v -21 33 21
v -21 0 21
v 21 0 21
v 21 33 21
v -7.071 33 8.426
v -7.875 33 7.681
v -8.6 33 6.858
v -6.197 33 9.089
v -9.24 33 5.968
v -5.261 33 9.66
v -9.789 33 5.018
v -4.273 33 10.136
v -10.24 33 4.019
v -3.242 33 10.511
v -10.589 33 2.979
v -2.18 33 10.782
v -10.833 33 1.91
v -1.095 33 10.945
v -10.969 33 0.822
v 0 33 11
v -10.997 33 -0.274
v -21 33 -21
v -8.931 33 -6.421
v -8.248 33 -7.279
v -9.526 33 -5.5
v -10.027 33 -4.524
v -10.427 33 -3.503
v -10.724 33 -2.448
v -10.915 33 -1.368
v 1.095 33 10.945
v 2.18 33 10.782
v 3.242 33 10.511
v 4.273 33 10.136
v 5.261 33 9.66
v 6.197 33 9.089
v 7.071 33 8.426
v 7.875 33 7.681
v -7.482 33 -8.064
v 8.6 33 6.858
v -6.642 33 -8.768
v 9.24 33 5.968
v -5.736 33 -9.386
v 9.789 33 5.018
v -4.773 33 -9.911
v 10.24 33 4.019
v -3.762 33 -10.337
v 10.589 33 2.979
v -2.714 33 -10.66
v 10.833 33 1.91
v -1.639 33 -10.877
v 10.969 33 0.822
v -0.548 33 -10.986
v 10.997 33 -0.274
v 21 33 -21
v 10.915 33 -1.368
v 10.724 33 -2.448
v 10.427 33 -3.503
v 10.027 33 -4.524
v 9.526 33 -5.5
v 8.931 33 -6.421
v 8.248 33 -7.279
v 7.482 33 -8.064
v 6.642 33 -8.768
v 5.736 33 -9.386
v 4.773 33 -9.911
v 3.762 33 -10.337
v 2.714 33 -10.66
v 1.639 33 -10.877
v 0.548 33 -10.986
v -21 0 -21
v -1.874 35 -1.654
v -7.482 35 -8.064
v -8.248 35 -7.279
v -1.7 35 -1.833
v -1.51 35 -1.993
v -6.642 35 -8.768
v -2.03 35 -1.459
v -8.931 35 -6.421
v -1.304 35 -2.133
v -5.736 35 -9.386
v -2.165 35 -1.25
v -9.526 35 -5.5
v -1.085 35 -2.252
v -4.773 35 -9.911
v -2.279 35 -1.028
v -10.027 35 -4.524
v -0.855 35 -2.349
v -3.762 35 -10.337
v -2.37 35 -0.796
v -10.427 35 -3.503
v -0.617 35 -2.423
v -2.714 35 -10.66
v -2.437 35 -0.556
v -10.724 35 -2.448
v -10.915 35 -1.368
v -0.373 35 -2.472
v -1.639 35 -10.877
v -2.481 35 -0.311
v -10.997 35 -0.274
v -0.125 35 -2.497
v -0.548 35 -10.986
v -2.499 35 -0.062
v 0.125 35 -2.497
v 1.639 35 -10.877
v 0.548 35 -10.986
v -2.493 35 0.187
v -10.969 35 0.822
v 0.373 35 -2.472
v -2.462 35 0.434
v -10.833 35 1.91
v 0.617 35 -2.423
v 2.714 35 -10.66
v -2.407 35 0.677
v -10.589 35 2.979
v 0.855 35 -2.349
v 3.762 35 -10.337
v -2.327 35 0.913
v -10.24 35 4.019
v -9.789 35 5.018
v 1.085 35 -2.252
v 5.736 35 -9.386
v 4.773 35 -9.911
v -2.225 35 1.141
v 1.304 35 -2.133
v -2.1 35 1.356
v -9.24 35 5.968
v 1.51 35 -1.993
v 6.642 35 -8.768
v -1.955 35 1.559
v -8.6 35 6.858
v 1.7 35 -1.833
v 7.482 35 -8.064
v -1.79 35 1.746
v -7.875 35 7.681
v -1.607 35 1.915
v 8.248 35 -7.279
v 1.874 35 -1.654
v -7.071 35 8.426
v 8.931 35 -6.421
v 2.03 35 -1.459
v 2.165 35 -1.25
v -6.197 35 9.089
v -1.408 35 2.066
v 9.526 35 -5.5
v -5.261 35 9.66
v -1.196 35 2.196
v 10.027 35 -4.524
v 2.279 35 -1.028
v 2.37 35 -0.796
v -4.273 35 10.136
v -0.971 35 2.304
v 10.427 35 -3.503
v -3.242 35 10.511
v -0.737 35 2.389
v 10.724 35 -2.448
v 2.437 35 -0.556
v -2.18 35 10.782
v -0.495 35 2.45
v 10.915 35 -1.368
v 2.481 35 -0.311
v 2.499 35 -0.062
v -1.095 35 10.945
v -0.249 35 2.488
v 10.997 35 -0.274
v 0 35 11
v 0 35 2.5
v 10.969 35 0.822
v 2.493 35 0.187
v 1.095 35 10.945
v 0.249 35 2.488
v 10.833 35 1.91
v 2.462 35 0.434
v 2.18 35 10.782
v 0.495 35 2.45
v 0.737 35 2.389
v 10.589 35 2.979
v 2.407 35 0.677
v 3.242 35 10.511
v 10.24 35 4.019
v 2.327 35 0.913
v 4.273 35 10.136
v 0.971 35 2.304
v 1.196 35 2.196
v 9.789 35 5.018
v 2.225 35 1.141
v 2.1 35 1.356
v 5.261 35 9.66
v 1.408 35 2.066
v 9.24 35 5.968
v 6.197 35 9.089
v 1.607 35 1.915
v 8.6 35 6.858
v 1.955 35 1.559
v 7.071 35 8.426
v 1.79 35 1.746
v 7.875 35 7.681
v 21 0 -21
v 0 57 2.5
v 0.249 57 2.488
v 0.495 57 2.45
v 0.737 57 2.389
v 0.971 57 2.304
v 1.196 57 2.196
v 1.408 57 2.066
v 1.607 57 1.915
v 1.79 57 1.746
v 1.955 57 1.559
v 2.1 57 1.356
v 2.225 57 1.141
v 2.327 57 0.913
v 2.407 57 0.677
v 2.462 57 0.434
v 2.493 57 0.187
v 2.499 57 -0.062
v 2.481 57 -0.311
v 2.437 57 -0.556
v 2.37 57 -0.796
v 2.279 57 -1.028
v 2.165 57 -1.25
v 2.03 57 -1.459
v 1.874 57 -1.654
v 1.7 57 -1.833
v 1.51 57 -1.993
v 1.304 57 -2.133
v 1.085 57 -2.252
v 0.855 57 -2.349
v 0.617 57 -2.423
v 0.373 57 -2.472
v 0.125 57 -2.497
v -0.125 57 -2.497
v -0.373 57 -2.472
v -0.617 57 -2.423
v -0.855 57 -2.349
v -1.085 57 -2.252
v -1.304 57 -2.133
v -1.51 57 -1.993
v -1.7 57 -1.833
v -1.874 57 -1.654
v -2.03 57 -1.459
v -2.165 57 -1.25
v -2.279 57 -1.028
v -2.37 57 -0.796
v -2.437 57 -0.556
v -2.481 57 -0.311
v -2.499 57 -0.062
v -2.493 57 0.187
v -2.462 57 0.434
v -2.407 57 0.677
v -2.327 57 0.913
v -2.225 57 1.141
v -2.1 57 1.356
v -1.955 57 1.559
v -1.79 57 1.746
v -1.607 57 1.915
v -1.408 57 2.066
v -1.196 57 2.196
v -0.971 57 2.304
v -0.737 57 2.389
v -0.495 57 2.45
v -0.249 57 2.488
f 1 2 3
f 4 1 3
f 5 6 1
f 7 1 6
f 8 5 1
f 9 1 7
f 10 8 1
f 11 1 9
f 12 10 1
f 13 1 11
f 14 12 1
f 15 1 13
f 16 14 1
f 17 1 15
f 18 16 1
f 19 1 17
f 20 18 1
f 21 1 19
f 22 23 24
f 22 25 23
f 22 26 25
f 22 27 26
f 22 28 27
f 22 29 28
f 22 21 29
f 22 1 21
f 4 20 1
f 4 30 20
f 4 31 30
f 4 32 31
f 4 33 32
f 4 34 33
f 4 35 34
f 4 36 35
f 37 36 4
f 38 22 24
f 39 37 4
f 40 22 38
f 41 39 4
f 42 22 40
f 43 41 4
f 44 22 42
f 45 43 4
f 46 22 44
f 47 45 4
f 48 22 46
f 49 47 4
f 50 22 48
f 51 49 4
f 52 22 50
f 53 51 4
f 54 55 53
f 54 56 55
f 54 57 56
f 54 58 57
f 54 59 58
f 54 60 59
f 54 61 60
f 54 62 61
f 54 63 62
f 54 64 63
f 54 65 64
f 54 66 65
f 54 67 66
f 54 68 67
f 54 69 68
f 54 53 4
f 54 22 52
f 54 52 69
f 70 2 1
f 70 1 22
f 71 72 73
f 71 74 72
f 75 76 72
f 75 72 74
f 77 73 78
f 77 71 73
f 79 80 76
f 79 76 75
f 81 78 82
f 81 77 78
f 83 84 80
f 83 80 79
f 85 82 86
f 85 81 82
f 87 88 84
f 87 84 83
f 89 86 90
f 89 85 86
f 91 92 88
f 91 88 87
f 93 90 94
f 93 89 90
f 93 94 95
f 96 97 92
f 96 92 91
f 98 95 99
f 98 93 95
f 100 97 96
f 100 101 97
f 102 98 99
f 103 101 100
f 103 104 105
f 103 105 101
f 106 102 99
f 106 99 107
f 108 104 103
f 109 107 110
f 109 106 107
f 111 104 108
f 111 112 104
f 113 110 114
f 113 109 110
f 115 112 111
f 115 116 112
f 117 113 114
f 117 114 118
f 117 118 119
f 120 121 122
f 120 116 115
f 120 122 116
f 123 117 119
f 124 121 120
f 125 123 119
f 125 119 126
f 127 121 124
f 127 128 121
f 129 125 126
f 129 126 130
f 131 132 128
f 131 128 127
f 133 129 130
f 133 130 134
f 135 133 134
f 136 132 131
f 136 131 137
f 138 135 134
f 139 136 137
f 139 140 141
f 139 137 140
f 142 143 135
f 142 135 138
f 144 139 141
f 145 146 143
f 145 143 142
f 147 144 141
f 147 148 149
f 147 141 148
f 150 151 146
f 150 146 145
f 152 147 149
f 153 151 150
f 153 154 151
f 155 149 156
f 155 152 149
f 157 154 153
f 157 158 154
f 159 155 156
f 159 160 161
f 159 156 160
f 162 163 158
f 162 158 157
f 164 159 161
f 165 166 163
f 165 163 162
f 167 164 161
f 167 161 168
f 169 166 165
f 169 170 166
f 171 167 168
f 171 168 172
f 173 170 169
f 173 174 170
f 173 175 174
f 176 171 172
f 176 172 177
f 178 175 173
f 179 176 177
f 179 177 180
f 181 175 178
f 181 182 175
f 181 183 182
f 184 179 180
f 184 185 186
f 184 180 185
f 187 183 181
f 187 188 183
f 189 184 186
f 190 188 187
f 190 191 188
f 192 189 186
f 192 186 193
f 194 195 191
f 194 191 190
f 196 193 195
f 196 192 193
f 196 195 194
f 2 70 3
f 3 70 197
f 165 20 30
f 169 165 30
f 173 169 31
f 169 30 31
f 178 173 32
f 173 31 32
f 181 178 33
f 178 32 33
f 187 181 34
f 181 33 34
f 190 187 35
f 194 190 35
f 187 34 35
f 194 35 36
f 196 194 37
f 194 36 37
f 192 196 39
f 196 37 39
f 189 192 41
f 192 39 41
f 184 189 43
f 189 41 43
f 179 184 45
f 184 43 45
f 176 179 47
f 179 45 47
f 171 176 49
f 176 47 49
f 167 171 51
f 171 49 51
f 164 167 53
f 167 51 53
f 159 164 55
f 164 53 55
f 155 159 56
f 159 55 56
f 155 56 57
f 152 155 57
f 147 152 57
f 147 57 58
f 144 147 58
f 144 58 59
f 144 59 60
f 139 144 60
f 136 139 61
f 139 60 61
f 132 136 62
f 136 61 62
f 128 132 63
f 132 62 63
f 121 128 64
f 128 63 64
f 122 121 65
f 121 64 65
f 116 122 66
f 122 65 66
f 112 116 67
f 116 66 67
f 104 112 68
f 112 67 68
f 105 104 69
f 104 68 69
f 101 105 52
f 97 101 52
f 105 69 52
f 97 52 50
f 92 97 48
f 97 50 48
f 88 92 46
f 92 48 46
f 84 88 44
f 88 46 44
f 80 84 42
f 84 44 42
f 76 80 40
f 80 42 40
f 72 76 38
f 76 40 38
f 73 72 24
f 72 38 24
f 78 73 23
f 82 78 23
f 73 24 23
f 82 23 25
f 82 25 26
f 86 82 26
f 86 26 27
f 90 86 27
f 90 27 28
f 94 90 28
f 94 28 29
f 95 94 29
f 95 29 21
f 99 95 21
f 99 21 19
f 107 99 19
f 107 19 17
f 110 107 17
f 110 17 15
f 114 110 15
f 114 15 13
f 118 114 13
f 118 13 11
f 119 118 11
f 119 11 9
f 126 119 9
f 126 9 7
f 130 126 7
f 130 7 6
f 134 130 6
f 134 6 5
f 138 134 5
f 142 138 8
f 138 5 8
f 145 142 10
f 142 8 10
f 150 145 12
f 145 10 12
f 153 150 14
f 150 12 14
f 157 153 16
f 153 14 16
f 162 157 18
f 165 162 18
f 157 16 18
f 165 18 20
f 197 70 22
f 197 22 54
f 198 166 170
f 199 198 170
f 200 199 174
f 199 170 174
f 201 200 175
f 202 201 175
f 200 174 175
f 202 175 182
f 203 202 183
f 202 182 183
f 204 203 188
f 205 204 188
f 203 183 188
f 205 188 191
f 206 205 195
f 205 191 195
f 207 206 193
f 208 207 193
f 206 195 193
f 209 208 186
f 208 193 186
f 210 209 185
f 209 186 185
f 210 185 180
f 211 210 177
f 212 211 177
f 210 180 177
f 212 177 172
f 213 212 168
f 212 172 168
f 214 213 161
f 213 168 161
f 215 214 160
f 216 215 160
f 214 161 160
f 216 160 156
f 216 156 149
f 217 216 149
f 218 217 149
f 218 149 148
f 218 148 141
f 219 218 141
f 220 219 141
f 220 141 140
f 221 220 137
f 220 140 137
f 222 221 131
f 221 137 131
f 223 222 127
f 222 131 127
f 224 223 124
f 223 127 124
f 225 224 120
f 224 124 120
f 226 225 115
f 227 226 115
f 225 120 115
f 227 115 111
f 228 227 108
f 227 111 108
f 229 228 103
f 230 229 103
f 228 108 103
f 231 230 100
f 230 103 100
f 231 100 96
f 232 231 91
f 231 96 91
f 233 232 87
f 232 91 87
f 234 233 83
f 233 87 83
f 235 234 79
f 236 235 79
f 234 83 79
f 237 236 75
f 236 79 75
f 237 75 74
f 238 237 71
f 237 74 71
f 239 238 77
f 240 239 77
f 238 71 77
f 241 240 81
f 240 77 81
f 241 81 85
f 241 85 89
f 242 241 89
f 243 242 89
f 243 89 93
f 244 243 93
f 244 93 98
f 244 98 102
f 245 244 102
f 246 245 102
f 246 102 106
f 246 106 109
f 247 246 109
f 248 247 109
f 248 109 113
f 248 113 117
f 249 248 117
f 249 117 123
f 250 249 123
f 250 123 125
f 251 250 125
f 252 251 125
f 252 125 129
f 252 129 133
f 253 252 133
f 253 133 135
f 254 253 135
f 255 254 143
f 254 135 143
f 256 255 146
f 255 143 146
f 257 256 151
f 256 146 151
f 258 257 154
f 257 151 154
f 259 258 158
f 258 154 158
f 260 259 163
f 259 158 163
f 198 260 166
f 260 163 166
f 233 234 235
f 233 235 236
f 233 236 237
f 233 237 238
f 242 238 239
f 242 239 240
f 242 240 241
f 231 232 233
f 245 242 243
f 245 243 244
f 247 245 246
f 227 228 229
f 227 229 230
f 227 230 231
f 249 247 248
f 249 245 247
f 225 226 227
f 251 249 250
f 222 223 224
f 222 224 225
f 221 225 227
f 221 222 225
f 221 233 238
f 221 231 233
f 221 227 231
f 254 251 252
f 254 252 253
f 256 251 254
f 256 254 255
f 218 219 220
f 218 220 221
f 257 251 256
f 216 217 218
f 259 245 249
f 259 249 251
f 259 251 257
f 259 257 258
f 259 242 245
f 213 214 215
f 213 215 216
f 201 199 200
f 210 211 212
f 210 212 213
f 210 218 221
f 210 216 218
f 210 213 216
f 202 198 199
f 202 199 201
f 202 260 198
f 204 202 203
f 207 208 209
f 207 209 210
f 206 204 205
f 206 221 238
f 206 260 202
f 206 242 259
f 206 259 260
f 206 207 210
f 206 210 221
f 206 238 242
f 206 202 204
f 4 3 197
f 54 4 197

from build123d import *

# Parameters (mm, degrees)
SKETCH1_W           = 42
SKETCH1_H           = 42
BOSS_EXTRUDE1_DEPTH = 33
SKETCH2_R           = 11
BOSS_EXTRUDE2_DEPTH = 2
SKETCH3_R           = 2.5
BOSS_EXTRUDE3_DEPTH = 22


with BuildPart() as part:
    # Sketch1 → Boss-Extrude1 (new body)
    with BuildSketch(Plane(origin=(0, 0, 0), x_dir=(1, 0, 0), z_dir=(0, 1, 0))):
        Rectangle(SKETCH1_W, SKETCH1_H)
    extrude(amount=BOSS_EXTRUDE1_DEPTH)

    # Sketch2 → Boss-Extrude2 (add)
    with BuildSketch(Plane(origin=(0, 33, 0), x_dir=(1, 0, 0), z_dir=(0, 1, 0))):
        with Locations(Location((0, 0, 0), (0, 0, 270))):
            Circle(SKETCH2_R)
    extrude(amount=BOSS_EXTRUDE2_DEPTH)

    # Sketch3 → Boss-Extrude3 (add)
    with BuildSketch(Plane(origin=(0, 35, 0), x_dir=(1, 0, 0), z_dir=(0, 1, 0))):
        with Locations(Location((0, 0, 0), (0, 0, 270))):
            Circle(SKETCH3_R)
    extrude(amount=BOSS_EXTRUDE3_DEPTH)


solid = part.part
